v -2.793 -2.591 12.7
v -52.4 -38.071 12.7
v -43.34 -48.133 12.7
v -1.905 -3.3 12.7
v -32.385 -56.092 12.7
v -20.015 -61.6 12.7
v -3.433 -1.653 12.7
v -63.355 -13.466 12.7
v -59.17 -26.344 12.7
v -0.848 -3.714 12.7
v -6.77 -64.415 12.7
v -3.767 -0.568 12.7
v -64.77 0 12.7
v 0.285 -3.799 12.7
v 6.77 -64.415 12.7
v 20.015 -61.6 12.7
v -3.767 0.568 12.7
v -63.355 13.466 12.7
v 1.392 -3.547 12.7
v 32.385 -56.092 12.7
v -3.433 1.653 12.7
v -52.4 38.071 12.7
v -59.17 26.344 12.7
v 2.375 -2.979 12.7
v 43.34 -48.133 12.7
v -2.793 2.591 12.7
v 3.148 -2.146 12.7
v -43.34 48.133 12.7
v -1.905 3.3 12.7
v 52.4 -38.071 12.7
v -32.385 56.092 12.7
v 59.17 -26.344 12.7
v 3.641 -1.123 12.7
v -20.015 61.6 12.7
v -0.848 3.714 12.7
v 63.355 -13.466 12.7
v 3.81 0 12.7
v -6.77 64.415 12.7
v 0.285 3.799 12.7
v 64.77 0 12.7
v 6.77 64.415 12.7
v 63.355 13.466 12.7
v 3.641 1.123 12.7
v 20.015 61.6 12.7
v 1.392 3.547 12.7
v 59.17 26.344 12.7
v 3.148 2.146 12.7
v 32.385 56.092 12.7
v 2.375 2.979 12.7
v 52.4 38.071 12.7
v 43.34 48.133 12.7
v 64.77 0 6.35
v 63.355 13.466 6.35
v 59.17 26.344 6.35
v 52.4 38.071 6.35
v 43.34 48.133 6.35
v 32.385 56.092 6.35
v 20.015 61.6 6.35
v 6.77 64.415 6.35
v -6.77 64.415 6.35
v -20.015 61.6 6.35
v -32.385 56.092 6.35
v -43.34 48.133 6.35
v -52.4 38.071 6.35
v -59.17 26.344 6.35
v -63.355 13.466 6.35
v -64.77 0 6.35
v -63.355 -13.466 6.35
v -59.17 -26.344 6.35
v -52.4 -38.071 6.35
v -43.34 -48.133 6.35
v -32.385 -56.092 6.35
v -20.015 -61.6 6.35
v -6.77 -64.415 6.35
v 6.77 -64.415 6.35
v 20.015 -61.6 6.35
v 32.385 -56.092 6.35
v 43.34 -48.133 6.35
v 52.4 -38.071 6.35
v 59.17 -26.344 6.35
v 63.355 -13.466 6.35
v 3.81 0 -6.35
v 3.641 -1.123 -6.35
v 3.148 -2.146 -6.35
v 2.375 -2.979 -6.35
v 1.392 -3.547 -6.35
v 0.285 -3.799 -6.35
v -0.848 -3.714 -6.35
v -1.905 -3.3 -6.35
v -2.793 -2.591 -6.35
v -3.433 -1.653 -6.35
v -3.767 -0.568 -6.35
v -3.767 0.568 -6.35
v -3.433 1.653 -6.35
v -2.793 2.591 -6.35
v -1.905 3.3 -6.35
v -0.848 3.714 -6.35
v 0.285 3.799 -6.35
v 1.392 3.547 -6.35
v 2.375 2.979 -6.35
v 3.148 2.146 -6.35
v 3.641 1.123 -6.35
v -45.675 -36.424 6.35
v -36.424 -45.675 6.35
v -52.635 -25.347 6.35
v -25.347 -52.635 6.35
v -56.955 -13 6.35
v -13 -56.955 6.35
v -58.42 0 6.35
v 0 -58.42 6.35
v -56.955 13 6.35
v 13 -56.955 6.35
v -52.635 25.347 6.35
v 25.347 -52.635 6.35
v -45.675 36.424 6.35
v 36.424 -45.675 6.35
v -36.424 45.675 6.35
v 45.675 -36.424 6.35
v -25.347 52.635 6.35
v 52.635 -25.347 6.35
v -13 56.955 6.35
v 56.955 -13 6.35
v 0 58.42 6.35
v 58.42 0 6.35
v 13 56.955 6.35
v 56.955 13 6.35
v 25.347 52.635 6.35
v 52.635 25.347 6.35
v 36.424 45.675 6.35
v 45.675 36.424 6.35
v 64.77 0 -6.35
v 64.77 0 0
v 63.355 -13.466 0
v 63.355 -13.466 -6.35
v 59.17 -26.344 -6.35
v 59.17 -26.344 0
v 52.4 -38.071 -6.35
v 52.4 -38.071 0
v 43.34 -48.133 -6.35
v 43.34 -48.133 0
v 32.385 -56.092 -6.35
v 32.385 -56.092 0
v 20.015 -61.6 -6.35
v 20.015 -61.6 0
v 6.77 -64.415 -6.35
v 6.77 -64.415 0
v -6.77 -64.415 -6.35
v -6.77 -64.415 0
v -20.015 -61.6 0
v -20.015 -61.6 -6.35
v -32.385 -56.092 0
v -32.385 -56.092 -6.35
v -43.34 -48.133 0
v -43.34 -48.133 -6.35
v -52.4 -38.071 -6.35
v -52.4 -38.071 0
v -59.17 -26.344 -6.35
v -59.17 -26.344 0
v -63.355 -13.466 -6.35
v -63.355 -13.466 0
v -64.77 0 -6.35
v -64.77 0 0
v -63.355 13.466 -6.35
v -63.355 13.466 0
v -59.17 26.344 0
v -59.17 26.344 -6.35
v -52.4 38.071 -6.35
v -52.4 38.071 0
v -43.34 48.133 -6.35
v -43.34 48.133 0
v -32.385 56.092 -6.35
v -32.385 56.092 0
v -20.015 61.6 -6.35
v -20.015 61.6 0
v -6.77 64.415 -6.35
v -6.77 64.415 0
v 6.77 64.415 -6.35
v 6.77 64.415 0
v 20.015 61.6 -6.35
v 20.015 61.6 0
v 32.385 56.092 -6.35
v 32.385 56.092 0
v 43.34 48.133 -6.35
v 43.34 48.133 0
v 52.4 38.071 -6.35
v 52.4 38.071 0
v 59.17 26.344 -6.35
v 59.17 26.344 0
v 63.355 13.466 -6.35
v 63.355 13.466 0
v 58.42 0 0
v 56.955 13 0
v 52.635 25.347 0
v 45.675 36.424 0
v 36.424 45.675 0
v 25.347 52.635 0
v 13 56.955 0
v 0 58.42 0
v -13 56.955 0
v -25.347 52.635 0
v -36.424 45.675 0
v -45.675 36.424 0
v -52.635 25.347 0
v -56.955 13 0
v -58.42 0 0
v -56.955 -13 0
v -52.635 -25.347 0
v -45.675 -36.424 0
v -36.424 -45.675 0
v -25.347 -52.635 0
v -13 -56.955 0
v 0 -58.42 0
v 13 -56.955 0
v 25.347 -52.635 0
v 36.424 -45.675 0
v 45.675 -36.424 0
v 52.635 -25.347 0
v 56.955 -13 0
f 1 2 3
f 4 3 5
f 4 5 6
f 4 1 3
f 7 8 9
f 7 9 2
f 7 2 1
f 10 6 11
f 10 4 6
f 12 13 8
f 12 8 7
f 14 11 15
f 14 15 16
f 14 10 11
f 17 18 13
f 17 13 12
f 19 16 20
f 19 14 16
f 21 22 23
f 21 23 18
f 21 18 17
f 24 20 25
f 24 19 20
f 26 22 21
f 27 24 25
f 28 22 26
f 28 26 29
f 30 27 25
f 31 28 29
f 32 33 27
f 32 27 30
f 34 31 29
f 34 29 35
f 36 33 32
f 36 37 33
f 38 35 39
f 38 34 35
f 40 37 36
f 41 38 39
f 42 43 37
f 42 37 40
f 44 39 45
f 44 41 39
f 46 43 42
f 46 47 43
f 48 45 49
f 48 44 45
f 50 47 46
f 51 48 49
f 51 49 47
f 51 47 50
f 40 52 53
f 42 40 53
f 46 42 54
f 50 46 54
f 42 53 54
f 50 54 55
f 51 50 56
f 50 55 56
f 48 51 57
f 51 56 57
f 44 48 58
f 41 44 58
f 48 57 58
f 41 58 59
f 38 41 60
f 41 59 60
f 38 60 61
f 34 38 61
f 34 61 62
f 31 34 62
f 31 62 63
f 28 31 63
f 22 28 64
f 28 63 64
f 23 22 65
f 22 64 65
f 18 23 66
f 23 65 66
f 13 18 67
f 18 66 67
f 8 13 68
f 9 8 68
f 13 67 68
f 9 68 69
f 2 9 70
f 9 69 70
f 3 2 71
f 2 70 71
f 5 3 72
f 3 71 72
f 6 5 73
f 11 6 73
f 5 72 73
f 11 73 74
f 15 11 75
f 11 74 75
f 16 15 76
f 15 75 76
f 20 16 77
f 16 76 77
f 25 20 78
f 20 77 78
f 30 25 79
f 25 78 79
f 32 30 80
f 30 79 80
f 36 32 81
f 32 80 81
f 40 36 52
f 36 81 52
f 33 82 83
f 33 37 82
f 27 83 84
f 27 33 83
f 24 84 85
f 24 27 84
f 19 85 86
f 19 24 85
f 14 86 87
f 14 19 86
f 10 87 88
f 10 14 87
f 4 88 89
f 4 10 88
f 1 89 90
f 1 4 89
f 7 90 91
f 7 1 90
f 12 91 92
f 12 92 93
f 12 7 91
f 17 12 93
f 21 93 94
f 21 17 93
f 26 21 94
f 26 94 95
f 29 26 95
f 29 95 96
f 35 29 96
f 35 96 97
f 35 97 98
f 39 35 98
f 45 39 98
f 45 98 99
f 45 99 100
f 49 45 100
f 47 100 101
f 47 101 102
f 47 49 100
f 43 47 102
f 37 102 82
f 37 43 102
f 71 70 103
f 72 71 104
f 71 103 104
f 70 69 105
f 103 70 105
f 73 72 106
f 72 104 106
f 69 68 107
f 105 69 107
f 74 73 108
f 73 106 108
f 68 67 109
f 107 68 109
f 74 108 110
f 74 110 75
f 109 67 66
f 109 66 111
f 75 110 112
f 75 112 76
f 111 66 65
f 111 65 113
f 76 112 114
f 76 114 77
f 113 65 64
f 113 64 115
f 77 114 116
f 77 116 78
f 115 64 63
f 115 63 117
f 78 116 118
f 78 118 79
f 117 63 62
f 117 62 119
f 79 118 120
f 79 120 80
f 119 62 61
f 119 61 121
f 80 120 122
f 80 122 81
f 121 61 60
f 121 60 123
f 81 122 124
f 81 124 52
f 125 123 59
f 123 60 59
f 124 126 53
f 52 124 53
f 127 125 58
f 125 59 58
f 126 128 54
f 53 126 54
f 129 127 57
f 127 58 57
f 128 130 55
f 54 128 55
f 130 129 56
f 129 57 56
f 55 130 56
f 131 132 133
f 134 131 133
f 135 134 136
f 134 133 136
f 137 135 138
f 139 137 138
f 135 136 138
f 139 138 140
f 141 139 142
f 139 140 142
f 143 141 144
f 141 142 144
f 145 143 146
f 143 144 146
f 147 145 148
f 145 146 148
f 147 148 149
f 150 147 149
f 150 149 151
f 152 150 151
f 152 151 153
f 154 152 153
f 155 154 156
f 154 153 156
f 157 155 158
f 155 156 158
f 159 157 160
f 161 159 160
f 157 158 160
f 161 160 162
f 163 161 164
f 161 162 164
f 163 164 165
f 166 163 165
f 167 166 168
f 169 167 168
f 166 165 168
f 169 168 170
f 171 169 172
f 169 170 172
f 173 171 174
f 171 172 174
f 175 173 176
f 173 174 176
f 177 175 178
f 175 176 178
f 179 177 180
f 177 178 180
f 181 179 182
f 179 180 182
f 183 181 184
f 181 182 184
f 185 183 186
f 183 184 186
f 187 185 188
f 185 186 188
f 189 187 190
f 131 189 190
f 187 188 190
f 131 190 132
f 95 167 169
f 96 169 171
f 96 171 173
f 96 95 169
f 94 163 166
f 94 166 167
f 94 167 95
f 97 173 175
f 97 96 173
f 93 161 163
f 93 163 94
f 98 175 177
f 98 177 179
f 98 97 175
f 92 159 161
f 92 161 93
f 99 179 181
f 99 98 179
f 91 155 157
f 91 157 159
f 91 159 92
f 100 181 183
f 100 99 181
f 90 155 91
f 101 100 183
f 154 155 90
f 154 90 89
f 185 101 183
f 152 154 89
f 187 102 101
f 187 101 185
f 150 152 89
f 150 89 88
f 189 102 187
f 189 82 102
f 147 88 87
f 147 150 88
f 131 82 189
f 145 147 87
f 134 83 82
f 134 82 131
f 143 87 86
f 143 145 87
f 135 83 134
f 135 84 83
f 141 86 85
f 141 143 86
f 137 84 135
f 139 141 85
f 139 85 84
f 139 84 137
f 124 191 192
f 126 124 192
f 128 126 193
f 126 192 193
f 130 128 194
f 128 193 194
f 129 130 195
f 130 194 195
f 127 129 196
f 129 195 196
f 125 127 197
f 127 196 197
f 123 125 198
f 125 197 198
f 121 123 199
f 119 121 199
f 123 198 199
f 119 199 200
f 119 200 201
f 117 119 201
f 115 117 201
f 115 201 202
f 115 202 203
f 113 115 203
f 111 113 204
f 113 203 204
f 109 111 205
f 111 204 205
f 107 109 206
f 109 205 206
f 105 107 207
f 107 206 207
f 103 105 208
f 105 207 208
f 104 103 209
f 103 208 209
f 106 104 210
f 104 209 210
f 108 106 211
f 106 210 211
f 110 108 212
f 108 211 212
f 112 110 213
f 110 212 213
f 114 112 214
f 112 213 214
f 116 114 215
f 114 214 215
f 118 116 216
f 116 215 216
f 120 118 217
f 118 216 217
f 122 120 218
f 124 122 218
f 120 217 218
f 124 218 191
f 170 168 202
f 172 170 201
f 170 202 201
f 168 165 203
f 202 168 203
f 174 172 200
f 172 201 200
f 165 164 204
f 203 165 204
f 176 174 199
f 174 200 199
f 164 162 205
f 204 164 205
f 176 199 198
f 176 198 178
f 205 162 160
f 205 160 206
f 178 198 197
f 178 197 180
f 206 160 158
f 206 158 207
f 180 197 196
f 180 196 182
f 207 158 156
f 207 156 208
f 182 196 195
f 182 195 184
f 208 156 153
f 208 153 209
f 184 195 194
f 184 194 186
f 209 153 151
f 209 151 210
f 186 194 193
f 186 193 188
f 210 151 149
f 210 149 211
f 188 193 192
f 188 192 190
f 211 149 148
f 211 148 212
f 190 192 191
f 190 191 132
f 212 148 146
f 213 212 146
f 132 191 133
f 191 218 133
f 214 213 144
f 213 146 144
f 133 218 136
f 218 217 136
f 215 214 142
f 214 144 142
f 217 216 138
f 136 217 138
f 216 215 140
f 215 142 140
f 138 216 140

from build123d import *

# Parameters (mm, degrees)
F0_R     = 58.42
F1_DEPTH = 6.35
F2_R     = 3.81
F3_DEPTH = 25.4
F4_R     = 64.77
F4_R_2   = 58.42
F4_R_3   = 3.81
F5_DEPTH = 6.35
F6_R     = 64.77
F6_R_2   = 58.42
F6_R_3   = 3.81
F7_DEPTH = 6.35


with BuildPart() as f1:
    # F0 (on Top) → F1 (new body)
    with BuildSketch(Plane.XY):
        Circle(F0_R)
    extrude(amount=F1_DEPTH)

    # F2 (on face) → F3 (cut)
    with BuildSketch(Plane.XY.offset(6.35)):
        Circle(F2_R)
    extrude(amount=-F3_DEPTH, mode=Mode.SUBTRACT)

    # F4 (on face) → F5 (join)
    with BuildSketch(Plane.XY.offset(6.35)):
        Circle(F4_R)
        Circle(F4_R_2, mode=Mode.SUBTRACT)
        Circle(F4_R_2)
        Circle(F4_R_3, mode=Mode.SUBTRACT)
    extrude(amount=F5_DEPTH)

    # F6 (on face) → F7 (join)
    with BuildSketch(Plane(origin=(0, 0, 0), x_dir=(1, 0, 0), z_dir=(0, 0, -1))):
        Circle(F6_R)
        Circle(F6_R_2, mode=Mode.SUBTRACT)
        Circle(F6_R_2)
        Circle(F6_R_3, mode=Mode.SUBTRACT)
    extrude(amount=F7_DEPTH)


solid = f1.part
